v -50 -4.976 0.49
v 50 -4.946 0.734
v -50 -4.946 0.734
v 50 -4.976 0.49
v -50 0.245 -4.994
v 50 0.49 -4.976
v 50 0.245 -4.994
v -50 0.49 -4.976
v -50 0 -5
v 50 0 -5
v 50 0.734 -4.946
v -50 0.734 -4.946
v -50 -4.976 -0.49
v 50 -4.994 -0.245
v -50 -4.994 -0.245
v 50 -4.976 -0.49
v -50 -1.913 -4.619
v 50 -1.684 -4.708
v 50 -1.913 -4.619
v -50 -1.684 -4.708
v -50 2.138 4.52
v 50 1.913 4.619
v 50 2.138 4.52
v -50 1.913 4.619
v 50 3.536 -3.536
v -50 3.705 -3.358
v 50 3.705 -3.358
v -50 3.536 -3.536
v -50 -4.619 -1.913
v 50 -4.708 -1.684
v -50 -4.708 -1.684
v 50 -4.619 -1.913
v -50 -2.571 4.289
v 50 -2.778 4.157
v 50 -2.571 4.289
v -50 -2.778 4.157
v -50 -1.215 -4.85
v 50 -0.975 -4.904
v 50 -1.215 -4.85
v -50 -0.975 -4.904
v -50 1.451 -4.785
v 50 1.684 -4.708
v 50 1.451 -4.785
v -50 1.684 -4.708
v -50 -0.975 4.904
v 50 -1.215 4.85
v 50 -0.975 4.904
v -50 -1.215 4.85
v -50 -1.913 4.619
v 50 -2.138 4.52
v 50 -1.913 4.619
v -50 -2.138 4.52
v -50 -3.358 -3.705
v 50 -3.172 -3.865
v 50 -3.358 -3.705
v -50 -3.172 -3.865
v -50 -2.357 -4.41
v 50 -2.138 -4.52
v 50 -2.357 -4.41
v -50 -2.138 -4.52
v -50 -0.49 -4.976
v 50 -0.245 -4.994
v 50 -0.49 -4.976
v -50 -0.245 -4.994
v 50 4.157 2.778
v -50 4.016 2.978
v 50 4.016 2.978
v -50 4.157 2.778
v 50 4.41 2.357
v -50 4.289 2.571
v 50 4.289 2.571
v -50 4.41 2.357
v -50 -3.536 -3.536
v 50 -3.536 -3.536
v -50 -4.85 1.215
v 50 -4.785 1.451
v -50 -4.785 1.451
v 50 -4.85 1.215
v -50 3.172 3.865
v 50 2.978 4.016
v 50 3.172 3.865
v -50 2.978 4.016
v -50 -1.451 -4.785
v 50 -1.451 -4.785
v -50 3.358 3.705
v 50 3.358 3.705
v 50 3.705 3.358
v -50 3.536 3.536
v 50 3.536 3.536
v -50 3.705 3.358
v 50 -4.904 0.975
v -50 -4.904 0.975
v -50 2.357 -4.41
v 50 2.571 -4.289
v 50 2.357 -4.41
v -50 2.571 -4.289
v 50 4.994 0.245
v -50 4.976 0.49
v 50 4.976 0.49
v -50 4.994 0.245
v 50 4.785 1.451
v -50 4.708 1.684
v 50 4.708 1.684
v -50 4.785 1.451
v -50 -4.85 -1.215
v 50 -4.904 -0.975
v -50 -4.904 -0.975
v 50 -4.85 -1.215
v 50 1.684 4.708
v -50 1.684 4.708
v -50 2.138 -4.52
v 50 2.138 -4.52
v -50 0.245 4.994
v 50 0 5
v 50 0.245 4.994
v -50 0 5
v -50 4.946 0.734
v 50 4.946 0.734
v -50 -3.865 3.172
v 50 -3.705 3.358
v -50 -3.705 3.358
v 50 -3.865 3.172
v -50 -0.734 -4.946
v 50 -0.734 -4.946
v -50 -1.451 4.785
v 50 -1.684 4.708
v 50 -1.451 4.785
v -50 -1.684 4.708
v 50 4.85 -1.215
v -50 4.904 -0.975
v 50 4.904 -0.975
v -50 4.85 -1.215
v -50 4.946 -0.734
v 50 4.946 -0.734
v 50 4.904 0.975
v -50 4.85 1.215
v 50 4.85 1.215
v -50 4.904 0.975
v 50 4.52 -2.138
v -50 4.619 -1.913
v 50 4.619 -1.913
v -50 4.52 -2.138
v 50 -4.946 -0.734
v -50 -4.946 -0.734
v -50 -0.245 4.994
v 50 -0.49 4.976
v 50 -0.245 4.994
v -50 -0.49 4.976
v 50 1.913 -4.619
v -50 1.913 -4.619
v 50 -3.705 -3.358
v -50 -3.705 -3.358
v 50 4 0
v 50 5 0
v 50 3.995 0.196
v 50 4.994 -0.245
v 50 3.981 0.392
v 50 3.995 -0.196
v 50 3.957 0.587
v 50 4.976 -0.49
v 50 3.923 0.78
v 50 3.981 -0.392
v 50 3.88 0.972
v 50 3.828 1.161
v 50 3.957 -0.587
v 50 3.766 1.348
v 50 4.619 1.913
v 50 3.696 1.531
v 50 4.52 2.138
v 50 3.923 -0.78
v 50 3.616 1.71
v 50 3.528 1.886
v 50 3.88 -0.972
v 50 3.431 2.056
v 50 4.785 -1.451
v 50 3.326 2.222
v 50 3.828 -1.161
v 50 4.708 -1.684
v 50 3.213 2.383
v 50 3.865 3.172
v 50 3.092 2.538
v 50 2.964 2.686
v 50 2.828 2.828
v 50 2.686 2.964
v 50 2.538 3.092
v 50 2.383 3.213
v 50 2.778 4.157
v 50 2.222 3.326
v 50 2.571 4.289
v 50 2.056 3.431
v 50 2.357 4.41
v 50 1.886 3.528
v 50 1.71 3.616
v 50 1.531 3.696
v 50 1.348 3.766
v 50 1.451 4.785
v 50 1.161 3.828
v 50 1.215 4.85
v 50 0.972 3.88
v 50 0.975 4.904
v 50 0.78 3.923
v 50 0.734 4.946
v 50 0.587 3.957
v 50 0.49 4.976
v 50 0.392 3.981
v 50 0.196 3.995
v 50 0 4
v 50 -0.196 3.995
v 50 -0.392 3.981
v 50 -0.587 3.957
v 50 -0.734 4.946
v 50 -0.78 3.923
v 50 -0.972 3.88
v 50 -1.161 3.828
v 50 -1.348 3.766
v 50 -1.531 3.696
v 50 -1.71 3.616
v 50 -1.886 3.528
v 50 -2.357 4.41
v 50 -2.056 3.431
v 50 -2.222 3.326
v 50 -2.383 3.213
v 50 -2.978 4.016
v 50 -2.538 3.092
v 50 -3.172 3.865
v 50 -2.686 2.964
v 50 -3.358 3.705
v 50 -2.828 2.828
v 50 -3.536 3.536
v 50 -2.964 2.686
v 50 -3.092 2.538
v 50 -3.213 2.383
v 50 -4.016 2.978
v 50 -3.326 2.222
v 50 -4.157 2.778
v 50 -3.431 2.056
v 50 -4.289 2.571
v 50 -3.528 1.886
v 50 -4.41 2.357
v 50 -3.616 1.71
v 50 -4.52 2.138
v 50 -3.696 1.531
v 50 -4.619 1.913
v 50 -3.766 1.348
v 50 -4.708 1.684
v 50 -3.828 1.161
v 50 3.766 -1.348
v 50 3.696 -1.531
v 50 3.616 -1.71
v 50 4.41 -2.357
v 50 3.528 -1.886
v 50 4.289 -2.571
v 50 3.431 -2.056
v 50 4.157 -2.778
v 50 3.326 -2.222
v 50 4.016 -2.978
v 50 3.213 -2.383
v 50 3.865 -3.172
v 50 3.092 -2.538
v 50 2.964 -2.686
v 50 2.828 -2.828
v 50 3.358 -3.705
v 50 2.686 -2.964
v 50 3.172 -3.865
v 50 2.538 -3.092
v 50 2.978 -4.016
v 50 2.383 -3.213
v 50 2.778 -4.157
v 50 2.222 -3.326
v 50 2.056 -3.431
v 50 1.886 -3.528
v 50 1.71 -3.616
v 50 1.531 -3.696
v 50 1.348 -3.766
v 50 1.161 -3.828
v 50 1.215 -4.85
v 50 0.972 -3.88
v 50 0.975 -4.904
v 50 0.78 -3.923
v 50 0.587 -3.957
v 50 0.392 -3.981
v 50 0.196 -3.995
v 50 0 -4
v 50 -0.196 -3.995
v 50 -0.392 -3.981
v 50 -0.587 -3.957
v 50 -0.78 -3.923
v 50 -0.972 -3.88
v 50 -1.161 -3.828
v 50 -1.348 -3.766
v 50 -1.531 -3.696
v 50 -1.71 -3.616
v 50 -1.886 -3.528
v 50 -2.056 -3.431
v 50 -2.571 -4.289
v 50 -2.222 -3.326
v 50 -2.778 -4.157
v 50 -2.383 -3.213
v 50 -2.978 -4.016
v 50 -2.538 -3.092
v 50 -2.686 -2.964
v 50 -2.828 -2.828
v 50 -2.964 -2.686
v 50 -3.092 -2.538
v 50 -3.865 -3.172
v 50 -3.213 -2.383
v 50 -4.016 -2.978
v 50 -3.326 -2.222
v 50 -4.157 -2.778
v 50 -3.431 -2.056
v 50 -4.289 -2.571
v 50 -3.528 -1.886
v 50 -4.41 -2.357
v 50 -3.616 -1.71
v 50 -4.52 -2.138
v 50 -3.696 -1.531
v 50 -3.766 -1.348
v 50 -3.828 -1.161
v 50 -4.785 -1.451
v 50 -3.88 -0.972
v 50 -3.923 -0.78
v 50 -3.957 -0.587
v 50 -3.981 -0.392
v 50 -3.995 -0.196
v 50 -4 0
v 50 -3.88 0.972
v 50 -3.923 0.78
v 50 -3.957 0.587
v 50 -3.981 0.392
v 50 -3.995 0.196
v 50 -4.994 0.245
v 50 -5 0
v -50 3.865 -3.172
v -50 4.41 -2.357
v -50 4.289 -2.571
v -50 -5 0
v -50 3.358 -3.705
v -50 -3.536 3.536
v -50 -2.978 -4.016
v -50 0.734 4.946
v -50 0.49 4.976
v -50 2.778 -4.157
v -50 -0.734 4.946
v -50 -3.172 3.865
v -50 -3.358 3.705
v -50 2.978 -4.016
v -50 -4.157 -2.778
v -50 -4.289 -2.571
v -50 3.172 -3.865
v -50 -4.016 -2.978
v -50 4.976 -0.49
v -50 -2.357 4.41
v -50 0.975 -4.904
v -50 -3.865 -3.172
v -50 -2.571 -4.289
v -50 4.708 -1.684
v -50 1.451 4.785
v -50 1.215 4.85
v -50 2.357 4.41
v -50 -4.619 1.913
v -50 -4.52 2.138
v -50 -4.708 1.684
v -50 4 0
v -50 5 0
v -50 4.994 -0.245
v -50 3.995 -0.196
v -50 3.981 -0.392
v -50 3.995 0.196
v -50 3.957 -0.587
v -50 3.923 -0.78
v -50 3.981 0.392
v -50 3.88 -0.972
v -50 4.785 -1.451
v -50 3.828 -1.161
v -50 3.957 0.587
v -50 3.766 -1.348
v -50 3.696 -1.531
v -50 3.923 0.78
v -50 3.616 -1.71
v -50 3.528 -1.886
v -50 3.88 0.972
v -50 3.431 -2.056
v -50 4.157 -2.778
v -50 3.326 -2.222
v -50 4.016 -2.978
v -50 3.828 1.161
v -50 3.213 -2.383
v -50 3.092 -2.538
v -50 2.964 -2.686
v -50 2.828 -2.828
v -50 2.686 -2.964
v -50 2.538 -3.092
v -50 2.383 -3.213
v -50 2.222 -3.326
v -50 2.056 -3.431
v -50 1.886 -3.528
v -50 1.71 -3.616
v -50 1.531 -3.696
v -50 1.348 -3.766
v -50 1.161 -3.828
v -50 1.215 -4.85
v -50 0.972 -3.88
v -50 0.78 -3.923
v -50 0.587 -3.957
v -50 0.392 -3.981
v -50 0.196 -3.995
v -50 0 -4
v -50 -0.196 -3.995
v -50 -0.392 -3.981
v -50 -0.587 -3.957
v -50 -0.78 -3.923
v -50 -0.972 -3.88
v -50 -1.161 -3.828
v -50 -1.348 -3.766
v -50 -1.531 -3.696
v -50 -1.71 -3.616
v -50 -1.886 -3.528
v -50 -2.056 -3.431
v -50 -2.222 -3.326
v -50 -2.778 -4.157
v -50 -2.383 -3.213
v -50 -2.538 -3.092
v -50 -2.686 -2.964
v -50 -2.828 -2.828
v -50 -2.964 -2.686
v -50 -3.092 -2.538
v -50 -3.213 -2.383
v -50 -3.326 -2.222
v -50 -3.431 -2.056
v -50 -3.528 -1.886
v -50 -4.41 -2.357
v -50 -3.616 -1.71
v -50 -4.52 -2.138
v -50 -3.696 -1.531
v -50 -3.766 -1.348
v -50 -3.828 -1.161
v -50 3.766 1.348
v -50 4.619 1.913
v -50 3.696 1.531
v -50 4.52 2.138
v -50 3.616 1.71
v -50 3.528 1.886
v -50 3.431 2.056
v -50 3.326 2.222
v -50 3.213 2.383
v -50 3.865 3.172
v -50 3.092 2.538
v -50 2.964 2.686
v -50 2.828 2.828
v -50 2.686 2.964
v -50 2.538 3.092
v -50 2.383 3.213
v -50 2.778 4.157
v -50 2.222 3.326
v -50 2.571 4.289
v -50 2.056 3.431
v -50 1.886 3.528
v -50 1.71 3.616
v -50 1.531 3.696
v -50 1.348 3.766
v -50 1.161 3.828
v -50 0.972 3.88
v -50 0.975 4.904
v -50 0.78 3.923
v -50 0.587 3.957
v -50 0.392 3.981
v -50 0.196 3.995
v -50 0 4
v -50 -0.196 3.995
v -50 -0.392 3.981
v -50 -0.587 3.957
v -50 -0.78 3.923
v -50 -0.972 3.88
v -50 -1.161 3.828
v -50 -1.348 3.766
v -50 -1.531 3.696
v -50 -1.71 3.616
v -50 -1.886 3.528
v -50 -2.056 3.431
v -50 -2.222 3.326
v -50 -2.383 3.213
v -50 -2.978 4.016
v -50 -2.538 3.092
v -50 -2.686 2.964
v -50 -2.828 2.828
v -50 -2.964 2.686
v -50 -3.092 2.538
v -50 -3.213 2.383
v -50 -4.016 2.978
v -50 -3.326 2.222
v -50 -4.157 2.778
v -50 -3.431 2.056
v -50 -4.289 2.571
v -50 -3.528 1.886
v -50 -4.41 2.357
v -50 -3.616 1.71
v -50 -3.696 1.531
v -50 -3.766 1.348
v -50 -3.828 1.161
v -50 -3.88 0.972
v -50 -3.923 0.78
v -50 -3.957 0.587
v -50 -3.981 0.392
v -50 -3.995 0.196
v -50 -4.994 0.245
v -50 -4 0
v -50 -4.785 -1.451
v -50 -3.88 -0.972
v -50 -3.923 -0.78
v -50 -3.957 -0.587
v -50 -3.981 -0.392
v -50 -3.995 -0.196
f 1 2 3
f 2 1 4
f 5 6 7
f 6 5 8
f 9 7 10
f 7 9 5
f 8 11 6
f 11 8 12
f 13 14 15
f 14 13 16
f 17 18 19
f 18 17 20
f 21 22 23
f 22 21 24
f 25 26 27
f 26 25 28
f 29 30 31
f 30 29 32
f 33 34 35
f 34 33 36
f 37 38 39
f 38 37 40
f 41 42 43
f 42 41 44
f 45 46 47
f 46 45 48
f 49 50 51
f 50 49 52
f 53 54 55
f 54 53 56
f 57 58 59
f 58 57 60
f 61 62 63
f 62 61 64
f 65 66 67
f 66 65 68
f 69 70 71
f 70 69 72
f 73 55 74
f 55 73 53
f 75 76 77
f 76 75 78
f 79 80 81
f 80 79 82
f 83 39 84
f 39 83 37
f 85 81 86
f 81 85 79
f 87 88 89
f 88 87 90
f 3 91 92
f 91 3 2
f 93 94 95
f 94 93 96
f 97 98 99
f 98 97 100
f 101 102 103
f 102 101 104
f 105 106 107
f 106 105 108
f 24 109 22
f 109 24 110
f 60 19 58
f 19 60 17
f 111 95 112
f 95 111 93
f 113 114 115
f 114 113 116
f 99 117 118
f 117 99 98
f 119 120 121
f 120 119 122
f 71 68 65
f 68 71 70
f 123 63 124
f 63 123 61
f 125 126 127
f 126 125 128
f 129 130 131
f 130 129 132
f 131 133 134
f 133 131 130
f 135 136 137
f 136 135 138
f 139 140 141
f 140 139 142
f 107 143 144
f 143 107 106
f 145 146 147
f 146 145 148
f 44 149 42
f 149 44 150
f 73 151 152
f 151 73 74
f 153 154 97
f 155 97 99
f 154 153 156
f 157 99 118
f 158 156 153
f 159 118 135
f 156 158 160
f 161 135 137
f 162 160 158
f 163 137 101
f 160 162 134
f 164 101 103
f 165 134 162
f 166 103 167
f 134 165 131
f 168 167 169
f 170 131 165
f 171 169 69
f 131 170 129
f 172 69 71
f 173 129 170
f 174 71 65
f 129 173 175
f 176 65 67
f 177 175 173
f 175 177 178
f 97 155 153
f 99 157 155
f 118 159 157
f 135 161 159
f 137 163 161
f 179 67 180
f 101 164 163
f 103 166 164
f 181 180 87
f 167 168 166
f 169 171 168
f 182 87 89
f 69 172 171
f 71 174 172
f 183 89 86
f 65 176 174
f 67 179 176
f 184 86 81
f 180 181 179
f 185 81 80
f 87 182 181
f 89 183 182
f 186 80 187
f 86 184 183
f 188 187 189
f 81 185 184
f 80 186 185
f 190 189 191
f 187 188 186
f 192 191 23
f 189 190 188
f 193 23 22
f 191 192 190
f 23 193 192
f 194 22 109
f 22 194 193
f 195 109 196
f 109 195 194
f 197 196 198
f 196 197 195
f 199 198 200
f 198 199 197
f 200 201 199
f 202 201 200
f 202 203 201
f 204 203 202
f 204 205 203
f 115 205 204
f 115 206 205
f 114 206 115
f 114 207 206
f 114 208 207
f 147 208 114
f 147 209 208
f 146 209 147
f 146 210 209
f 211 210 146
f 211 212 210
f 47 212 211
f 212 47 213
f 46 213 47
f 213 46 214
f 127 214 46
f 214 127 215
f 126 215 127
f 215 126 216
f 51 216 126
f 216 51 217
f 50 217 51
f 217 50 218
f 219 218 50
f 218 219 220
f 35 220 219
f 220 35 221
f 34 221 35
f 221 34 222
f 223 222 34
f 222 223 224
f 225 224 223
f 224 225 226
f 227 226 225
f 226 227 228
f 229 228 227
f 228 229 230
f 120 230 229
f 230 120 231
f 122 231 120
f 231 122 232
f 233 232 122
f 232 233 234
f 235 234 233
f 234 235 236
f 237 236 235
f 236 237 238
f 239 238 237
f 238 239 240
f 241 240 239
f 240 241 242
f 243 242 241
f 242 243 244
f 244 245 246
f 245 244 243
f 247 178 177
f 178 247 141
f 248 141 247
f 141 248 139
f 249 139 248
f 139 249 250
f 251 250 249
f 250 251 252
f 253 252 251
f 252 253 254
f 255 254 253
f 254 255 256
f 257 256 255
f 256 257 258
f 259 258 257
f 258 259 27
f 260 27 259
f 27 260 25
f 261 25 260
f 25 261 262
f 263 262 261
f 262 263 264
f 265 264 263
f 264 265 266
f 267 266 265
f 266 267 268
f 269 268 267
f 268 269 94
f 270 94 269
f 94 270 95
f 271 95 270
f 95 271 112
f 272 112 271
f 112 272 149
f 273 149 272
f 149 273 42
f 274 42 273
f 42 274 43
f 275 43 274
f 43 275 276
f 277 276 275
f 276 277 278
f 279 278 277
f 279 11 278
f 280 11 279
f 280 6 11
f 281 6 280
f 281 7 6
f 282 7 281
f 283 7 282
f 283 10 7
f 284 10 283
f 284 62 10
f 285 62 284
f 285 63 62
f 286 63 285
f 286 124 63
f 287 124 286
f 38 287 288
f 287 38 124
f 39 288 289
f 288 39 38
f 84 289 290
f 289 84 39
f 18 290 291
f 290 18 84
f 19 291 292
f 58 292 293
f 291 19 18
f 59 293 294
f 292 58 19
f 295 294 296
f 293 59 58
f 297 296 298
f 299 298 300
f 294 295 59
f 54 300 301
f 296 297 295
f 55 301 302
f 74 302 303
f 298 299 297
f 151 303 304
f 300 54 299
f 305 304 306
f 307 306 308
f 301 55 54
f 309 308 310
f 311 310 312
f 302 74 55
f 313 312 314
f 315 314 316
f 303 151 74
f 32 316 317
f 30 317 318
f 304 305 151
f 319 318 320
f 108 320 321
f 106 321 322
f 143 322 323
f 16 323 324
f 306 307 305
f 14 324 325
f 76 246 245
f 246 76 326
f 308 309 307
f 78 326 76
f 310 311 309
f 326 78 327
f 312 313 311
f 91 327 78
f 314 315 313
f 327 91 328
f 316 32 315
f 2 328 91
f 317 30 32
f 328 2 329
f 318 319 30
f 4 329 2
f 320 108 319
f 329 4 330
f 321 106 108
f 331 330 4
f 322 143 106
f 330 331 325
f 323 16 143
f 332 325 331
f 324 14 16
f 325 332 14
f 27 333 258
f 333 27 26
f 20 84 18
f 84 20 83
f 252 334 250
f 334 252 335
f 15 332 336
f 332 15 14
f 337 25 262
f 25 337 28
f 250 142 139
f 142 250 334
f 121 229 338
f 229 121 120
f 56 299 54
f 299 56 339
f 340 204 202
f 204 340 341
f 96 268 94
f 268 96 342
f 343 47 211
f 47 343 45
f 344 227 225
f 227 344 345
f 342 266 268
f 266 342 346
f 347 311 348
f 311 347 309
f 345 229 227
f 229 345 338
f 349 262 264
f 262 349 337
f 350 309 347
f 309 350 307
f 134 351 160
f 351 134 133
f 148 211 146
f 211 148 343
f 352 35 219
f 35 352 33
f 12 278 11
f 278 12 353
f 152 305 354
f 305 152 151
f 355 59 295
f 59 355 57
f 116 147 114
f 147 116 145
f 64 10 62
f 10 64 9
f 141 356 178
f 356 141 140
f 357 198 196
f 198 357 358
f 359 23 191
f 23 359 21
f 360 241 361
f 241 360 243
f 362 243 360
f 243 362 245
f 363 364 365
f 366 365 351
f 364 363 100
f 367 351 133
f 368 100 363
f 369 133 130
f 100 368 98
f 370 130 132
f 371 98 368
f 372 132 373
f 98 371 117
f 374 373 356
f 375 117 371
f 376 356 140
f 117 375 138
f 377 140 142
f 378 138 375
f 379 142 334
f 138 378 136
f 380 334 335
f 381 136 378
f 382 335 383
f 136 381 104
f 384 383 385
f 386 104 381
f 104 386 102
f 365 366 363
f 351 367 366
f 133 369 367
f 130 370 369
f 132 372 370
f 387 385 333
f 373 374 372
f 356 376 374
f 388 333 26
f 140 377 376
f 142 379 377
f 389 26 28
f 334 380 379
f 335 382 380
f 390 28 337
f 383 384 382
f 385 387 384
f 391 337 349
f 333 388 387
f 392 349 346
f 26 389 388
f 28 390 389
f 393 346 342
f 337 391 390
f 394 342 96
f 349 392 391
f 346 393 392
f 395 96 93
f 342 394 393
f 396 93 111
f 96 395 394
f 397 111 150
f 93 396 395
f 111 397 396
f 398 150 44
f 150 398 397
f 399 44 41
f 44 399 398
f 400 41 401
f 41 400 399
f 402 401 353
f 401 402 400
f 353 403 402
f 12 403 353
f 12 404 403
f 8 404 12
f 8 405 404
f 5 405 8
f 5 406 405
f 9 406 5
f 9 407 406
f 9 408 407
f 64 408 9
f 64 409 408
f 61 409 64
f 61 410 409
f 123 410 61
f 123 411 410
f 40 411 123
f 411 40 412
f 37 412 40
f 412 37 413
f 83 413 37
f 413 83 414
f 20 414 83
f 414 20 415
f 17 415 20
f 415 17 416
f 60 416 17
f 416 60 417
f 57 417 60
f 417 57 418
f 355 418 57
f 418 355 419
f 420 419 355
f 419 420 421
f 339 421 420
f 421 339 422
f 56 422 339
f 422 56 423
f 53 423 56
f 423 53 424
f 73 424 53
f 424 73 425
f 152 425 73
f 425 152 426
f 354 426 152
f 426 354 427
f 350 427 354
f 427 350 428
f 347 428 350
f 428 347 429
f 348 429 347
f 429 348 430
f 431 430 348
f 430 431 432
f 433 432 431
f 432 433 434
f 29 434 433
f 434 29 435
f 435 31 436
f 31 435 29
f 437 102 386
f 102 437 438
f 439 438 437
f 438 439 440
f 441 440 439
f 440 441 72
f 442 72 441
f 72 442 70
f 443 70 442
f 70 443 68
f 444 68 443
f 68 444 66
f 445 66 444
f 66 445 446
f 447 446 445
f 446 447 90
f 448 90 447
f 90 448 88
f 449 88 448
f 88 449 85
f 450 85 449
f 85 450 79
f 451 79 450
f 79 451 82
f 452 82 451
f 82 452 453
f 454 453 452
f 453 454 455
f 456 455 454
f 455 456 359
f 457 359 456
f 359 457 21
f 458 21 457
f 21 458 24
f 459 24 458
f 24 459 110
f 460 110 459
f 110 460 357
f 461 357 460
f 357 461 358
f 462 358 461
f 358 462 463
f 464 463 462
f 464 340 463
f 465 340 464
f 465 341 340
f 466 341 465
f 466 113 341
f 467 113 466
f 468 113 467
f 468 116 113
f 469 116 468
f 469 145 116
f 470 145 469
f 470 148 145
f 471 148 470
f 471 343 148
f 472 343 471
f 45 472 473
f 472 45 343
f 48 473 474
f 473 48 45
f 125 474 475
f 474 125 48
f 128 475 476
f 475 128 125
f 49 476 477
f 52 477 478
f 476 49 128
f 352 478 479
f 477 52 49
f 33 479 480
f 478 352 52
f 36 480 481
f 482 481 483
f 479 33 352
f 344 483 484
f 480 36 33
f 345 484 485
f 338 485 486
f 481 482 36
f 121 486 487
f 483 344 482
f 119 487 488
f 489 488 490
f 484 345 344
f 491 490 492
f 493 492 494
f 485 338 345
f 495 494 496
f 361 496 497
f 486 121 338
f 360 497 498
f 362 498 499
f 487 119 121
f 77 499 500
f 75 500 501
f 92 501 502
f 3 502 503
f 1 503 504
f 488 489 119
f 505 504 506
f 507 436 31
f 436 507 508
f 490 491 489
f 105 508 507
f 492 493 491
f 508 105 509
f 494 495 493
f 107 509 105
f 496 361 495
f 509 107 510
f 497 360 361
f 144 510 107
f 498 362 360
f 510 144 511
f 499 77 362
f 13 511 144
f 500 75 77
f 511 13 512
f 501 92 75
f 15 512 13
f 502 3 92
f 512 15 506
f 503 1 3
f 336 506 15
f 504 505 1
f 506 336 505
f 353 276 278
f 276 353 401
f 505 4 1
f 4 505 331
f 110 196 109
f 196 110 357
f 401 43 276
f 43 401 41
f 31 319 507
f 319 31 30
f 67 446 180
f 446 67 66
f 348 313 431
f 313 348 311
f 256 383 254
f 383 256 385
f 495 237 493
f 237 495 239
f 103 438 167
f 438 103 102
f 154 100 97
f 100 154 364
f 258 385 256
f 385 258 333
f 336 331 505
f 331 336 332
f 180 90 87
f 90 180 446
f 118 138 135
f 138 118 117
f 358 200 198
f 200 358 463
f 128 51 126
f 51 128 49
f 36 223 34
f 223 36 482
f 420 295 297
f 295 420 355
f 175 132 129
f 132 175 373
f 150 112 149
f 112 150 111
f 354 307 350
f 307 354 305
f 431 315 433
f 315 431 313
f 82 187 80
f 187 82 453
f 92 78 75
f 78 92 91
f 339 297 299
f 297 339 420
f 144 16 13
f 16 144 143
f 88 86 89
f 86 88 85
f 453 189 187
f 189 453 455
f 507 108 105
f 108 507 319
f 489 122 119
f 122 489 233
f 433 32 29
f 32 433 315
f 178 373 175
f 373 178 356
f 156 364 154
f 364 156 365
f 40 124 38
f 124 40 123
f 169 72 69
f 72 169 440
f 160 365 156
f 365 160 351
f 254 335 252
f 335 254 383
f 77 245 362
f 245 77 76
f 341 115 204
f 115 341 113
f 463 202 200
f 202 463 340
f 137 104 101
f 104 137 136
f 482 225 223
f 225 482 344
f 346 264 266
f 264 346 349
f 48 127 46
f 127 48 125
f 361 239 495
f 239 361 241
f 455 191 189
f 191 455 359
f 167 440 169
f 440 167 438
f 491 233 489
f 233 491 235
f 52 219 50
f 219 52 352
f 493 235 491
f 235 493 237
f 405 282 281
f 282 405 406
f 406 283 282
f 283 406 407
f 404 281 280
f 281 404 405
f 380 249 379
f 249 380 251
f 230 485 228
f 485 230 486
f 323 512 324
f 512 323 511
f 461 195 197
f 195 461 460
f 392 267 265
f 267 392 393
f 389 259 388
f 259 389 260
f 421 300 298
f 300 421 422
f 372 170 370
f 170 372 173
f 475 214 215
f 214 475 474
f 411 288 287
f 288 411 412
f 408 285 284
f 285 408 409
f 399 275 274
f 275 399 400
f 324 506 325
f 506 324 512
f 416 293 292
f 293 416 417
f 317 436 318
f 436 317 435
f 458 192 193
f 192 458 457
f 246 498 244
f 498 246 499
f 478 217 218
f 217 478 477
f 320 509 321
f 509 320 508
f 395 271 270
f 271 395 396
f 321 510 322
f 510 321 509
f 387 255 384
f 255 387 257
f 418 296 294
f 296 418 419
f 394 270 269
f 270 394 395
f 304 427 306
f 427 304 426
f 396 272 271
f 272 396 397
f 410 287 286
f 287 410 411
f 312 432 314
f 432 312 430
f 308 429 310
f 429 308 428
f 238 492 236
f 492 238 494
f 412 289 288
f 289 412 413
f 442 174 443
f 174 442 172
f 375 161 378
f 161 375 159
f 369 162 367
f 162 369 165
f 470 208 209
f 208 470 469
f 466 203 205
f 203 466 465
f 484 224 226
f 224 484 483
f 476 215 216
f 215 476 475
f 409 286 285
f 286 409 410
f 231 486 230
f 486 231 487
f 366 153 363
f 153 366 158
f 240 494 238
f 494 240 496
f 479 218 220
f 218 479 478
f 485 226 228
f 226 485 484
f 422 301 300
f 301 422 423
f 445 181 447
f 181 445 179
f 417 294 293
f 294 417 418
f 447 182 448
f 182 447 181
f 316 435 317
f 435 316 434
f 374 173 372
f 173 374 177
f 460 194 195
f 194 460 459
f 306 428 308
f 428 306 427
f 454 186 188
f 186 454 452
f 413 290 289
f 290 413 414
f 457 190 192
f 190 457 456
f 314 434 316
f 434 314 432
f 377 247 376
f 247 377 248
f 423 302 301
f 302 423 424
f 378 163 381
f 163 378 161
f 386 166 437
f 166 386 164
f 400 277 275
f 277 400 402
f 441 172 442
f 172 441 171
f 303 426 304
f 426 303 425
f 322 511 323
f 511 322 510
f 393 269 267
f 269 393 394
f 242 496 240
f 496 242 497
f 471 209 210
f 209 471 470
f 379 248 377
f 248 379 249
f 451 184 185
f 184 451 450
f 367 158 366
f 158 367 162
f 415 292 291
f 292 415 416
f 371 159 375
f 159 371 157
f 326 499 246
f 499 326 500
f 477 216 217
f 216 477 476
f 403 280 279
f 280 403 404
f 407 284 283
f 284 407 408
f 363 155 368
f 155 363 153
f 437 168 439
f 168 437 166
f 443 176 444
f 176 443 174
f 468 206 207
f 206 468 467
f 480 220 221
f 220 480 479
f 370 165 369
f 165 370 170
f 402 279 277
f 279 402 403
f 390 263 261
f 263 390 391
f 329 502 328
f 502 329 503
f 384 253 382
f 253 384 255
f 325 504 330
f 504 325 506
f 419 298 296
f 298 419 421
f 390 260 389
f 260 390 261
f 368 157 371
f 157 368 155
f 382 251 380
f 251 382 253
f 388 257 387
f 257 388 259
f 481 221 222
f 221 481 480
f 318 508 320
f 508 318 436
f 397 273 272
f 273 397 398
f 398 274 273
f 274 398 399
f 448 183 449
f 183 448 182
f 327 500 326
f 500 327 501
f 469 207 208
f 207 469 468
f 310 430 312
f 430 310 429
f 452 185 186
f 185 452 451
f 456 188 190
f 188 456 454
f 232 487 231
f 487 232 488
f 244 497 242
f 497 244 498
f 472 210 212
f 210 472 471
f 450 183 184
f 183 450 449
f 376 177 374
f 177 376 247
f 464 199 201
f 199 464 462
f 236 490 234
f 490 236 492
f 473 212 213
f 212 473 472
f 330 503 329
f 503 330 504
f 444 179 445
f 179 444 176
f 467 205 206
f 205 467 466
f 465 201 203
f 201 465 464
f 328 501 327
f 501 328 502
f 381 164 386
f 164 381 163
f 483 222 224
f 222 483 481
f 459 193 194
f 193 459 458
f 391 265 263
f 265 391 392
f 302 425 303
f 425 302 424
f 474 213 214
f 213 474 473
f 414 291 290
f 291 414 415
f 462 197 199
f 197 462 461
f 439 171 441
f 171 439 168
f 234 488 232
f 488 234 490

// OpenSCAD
// PTFE tubing (hollow) — ensure visible geometry in all views by orienting along X
// and using robust boolean with slight overlap.

outer_diameter = 10;   // mm
inner_diameter = 8;    // mm
length = 100;          // mm

$fn = 128;
eps = 0.05; // overlap to avoid coplanar/blank boolean artifacts

module tubing(od=outer_diameter, id=inner_diameter, h=length) {
    id2 = min(id, od - 2*eps); // keep a valid wall

    // Build along Z, then rotate so the tube runs along X (front/back/left/right show the bore)
    rotate([0, 90, 0])
    difference() {
        cylinder(d=od, h=h, center=true);
        cylinder(d=id2, h=h + 2*eps, center=true);
    }
}

tubing();
